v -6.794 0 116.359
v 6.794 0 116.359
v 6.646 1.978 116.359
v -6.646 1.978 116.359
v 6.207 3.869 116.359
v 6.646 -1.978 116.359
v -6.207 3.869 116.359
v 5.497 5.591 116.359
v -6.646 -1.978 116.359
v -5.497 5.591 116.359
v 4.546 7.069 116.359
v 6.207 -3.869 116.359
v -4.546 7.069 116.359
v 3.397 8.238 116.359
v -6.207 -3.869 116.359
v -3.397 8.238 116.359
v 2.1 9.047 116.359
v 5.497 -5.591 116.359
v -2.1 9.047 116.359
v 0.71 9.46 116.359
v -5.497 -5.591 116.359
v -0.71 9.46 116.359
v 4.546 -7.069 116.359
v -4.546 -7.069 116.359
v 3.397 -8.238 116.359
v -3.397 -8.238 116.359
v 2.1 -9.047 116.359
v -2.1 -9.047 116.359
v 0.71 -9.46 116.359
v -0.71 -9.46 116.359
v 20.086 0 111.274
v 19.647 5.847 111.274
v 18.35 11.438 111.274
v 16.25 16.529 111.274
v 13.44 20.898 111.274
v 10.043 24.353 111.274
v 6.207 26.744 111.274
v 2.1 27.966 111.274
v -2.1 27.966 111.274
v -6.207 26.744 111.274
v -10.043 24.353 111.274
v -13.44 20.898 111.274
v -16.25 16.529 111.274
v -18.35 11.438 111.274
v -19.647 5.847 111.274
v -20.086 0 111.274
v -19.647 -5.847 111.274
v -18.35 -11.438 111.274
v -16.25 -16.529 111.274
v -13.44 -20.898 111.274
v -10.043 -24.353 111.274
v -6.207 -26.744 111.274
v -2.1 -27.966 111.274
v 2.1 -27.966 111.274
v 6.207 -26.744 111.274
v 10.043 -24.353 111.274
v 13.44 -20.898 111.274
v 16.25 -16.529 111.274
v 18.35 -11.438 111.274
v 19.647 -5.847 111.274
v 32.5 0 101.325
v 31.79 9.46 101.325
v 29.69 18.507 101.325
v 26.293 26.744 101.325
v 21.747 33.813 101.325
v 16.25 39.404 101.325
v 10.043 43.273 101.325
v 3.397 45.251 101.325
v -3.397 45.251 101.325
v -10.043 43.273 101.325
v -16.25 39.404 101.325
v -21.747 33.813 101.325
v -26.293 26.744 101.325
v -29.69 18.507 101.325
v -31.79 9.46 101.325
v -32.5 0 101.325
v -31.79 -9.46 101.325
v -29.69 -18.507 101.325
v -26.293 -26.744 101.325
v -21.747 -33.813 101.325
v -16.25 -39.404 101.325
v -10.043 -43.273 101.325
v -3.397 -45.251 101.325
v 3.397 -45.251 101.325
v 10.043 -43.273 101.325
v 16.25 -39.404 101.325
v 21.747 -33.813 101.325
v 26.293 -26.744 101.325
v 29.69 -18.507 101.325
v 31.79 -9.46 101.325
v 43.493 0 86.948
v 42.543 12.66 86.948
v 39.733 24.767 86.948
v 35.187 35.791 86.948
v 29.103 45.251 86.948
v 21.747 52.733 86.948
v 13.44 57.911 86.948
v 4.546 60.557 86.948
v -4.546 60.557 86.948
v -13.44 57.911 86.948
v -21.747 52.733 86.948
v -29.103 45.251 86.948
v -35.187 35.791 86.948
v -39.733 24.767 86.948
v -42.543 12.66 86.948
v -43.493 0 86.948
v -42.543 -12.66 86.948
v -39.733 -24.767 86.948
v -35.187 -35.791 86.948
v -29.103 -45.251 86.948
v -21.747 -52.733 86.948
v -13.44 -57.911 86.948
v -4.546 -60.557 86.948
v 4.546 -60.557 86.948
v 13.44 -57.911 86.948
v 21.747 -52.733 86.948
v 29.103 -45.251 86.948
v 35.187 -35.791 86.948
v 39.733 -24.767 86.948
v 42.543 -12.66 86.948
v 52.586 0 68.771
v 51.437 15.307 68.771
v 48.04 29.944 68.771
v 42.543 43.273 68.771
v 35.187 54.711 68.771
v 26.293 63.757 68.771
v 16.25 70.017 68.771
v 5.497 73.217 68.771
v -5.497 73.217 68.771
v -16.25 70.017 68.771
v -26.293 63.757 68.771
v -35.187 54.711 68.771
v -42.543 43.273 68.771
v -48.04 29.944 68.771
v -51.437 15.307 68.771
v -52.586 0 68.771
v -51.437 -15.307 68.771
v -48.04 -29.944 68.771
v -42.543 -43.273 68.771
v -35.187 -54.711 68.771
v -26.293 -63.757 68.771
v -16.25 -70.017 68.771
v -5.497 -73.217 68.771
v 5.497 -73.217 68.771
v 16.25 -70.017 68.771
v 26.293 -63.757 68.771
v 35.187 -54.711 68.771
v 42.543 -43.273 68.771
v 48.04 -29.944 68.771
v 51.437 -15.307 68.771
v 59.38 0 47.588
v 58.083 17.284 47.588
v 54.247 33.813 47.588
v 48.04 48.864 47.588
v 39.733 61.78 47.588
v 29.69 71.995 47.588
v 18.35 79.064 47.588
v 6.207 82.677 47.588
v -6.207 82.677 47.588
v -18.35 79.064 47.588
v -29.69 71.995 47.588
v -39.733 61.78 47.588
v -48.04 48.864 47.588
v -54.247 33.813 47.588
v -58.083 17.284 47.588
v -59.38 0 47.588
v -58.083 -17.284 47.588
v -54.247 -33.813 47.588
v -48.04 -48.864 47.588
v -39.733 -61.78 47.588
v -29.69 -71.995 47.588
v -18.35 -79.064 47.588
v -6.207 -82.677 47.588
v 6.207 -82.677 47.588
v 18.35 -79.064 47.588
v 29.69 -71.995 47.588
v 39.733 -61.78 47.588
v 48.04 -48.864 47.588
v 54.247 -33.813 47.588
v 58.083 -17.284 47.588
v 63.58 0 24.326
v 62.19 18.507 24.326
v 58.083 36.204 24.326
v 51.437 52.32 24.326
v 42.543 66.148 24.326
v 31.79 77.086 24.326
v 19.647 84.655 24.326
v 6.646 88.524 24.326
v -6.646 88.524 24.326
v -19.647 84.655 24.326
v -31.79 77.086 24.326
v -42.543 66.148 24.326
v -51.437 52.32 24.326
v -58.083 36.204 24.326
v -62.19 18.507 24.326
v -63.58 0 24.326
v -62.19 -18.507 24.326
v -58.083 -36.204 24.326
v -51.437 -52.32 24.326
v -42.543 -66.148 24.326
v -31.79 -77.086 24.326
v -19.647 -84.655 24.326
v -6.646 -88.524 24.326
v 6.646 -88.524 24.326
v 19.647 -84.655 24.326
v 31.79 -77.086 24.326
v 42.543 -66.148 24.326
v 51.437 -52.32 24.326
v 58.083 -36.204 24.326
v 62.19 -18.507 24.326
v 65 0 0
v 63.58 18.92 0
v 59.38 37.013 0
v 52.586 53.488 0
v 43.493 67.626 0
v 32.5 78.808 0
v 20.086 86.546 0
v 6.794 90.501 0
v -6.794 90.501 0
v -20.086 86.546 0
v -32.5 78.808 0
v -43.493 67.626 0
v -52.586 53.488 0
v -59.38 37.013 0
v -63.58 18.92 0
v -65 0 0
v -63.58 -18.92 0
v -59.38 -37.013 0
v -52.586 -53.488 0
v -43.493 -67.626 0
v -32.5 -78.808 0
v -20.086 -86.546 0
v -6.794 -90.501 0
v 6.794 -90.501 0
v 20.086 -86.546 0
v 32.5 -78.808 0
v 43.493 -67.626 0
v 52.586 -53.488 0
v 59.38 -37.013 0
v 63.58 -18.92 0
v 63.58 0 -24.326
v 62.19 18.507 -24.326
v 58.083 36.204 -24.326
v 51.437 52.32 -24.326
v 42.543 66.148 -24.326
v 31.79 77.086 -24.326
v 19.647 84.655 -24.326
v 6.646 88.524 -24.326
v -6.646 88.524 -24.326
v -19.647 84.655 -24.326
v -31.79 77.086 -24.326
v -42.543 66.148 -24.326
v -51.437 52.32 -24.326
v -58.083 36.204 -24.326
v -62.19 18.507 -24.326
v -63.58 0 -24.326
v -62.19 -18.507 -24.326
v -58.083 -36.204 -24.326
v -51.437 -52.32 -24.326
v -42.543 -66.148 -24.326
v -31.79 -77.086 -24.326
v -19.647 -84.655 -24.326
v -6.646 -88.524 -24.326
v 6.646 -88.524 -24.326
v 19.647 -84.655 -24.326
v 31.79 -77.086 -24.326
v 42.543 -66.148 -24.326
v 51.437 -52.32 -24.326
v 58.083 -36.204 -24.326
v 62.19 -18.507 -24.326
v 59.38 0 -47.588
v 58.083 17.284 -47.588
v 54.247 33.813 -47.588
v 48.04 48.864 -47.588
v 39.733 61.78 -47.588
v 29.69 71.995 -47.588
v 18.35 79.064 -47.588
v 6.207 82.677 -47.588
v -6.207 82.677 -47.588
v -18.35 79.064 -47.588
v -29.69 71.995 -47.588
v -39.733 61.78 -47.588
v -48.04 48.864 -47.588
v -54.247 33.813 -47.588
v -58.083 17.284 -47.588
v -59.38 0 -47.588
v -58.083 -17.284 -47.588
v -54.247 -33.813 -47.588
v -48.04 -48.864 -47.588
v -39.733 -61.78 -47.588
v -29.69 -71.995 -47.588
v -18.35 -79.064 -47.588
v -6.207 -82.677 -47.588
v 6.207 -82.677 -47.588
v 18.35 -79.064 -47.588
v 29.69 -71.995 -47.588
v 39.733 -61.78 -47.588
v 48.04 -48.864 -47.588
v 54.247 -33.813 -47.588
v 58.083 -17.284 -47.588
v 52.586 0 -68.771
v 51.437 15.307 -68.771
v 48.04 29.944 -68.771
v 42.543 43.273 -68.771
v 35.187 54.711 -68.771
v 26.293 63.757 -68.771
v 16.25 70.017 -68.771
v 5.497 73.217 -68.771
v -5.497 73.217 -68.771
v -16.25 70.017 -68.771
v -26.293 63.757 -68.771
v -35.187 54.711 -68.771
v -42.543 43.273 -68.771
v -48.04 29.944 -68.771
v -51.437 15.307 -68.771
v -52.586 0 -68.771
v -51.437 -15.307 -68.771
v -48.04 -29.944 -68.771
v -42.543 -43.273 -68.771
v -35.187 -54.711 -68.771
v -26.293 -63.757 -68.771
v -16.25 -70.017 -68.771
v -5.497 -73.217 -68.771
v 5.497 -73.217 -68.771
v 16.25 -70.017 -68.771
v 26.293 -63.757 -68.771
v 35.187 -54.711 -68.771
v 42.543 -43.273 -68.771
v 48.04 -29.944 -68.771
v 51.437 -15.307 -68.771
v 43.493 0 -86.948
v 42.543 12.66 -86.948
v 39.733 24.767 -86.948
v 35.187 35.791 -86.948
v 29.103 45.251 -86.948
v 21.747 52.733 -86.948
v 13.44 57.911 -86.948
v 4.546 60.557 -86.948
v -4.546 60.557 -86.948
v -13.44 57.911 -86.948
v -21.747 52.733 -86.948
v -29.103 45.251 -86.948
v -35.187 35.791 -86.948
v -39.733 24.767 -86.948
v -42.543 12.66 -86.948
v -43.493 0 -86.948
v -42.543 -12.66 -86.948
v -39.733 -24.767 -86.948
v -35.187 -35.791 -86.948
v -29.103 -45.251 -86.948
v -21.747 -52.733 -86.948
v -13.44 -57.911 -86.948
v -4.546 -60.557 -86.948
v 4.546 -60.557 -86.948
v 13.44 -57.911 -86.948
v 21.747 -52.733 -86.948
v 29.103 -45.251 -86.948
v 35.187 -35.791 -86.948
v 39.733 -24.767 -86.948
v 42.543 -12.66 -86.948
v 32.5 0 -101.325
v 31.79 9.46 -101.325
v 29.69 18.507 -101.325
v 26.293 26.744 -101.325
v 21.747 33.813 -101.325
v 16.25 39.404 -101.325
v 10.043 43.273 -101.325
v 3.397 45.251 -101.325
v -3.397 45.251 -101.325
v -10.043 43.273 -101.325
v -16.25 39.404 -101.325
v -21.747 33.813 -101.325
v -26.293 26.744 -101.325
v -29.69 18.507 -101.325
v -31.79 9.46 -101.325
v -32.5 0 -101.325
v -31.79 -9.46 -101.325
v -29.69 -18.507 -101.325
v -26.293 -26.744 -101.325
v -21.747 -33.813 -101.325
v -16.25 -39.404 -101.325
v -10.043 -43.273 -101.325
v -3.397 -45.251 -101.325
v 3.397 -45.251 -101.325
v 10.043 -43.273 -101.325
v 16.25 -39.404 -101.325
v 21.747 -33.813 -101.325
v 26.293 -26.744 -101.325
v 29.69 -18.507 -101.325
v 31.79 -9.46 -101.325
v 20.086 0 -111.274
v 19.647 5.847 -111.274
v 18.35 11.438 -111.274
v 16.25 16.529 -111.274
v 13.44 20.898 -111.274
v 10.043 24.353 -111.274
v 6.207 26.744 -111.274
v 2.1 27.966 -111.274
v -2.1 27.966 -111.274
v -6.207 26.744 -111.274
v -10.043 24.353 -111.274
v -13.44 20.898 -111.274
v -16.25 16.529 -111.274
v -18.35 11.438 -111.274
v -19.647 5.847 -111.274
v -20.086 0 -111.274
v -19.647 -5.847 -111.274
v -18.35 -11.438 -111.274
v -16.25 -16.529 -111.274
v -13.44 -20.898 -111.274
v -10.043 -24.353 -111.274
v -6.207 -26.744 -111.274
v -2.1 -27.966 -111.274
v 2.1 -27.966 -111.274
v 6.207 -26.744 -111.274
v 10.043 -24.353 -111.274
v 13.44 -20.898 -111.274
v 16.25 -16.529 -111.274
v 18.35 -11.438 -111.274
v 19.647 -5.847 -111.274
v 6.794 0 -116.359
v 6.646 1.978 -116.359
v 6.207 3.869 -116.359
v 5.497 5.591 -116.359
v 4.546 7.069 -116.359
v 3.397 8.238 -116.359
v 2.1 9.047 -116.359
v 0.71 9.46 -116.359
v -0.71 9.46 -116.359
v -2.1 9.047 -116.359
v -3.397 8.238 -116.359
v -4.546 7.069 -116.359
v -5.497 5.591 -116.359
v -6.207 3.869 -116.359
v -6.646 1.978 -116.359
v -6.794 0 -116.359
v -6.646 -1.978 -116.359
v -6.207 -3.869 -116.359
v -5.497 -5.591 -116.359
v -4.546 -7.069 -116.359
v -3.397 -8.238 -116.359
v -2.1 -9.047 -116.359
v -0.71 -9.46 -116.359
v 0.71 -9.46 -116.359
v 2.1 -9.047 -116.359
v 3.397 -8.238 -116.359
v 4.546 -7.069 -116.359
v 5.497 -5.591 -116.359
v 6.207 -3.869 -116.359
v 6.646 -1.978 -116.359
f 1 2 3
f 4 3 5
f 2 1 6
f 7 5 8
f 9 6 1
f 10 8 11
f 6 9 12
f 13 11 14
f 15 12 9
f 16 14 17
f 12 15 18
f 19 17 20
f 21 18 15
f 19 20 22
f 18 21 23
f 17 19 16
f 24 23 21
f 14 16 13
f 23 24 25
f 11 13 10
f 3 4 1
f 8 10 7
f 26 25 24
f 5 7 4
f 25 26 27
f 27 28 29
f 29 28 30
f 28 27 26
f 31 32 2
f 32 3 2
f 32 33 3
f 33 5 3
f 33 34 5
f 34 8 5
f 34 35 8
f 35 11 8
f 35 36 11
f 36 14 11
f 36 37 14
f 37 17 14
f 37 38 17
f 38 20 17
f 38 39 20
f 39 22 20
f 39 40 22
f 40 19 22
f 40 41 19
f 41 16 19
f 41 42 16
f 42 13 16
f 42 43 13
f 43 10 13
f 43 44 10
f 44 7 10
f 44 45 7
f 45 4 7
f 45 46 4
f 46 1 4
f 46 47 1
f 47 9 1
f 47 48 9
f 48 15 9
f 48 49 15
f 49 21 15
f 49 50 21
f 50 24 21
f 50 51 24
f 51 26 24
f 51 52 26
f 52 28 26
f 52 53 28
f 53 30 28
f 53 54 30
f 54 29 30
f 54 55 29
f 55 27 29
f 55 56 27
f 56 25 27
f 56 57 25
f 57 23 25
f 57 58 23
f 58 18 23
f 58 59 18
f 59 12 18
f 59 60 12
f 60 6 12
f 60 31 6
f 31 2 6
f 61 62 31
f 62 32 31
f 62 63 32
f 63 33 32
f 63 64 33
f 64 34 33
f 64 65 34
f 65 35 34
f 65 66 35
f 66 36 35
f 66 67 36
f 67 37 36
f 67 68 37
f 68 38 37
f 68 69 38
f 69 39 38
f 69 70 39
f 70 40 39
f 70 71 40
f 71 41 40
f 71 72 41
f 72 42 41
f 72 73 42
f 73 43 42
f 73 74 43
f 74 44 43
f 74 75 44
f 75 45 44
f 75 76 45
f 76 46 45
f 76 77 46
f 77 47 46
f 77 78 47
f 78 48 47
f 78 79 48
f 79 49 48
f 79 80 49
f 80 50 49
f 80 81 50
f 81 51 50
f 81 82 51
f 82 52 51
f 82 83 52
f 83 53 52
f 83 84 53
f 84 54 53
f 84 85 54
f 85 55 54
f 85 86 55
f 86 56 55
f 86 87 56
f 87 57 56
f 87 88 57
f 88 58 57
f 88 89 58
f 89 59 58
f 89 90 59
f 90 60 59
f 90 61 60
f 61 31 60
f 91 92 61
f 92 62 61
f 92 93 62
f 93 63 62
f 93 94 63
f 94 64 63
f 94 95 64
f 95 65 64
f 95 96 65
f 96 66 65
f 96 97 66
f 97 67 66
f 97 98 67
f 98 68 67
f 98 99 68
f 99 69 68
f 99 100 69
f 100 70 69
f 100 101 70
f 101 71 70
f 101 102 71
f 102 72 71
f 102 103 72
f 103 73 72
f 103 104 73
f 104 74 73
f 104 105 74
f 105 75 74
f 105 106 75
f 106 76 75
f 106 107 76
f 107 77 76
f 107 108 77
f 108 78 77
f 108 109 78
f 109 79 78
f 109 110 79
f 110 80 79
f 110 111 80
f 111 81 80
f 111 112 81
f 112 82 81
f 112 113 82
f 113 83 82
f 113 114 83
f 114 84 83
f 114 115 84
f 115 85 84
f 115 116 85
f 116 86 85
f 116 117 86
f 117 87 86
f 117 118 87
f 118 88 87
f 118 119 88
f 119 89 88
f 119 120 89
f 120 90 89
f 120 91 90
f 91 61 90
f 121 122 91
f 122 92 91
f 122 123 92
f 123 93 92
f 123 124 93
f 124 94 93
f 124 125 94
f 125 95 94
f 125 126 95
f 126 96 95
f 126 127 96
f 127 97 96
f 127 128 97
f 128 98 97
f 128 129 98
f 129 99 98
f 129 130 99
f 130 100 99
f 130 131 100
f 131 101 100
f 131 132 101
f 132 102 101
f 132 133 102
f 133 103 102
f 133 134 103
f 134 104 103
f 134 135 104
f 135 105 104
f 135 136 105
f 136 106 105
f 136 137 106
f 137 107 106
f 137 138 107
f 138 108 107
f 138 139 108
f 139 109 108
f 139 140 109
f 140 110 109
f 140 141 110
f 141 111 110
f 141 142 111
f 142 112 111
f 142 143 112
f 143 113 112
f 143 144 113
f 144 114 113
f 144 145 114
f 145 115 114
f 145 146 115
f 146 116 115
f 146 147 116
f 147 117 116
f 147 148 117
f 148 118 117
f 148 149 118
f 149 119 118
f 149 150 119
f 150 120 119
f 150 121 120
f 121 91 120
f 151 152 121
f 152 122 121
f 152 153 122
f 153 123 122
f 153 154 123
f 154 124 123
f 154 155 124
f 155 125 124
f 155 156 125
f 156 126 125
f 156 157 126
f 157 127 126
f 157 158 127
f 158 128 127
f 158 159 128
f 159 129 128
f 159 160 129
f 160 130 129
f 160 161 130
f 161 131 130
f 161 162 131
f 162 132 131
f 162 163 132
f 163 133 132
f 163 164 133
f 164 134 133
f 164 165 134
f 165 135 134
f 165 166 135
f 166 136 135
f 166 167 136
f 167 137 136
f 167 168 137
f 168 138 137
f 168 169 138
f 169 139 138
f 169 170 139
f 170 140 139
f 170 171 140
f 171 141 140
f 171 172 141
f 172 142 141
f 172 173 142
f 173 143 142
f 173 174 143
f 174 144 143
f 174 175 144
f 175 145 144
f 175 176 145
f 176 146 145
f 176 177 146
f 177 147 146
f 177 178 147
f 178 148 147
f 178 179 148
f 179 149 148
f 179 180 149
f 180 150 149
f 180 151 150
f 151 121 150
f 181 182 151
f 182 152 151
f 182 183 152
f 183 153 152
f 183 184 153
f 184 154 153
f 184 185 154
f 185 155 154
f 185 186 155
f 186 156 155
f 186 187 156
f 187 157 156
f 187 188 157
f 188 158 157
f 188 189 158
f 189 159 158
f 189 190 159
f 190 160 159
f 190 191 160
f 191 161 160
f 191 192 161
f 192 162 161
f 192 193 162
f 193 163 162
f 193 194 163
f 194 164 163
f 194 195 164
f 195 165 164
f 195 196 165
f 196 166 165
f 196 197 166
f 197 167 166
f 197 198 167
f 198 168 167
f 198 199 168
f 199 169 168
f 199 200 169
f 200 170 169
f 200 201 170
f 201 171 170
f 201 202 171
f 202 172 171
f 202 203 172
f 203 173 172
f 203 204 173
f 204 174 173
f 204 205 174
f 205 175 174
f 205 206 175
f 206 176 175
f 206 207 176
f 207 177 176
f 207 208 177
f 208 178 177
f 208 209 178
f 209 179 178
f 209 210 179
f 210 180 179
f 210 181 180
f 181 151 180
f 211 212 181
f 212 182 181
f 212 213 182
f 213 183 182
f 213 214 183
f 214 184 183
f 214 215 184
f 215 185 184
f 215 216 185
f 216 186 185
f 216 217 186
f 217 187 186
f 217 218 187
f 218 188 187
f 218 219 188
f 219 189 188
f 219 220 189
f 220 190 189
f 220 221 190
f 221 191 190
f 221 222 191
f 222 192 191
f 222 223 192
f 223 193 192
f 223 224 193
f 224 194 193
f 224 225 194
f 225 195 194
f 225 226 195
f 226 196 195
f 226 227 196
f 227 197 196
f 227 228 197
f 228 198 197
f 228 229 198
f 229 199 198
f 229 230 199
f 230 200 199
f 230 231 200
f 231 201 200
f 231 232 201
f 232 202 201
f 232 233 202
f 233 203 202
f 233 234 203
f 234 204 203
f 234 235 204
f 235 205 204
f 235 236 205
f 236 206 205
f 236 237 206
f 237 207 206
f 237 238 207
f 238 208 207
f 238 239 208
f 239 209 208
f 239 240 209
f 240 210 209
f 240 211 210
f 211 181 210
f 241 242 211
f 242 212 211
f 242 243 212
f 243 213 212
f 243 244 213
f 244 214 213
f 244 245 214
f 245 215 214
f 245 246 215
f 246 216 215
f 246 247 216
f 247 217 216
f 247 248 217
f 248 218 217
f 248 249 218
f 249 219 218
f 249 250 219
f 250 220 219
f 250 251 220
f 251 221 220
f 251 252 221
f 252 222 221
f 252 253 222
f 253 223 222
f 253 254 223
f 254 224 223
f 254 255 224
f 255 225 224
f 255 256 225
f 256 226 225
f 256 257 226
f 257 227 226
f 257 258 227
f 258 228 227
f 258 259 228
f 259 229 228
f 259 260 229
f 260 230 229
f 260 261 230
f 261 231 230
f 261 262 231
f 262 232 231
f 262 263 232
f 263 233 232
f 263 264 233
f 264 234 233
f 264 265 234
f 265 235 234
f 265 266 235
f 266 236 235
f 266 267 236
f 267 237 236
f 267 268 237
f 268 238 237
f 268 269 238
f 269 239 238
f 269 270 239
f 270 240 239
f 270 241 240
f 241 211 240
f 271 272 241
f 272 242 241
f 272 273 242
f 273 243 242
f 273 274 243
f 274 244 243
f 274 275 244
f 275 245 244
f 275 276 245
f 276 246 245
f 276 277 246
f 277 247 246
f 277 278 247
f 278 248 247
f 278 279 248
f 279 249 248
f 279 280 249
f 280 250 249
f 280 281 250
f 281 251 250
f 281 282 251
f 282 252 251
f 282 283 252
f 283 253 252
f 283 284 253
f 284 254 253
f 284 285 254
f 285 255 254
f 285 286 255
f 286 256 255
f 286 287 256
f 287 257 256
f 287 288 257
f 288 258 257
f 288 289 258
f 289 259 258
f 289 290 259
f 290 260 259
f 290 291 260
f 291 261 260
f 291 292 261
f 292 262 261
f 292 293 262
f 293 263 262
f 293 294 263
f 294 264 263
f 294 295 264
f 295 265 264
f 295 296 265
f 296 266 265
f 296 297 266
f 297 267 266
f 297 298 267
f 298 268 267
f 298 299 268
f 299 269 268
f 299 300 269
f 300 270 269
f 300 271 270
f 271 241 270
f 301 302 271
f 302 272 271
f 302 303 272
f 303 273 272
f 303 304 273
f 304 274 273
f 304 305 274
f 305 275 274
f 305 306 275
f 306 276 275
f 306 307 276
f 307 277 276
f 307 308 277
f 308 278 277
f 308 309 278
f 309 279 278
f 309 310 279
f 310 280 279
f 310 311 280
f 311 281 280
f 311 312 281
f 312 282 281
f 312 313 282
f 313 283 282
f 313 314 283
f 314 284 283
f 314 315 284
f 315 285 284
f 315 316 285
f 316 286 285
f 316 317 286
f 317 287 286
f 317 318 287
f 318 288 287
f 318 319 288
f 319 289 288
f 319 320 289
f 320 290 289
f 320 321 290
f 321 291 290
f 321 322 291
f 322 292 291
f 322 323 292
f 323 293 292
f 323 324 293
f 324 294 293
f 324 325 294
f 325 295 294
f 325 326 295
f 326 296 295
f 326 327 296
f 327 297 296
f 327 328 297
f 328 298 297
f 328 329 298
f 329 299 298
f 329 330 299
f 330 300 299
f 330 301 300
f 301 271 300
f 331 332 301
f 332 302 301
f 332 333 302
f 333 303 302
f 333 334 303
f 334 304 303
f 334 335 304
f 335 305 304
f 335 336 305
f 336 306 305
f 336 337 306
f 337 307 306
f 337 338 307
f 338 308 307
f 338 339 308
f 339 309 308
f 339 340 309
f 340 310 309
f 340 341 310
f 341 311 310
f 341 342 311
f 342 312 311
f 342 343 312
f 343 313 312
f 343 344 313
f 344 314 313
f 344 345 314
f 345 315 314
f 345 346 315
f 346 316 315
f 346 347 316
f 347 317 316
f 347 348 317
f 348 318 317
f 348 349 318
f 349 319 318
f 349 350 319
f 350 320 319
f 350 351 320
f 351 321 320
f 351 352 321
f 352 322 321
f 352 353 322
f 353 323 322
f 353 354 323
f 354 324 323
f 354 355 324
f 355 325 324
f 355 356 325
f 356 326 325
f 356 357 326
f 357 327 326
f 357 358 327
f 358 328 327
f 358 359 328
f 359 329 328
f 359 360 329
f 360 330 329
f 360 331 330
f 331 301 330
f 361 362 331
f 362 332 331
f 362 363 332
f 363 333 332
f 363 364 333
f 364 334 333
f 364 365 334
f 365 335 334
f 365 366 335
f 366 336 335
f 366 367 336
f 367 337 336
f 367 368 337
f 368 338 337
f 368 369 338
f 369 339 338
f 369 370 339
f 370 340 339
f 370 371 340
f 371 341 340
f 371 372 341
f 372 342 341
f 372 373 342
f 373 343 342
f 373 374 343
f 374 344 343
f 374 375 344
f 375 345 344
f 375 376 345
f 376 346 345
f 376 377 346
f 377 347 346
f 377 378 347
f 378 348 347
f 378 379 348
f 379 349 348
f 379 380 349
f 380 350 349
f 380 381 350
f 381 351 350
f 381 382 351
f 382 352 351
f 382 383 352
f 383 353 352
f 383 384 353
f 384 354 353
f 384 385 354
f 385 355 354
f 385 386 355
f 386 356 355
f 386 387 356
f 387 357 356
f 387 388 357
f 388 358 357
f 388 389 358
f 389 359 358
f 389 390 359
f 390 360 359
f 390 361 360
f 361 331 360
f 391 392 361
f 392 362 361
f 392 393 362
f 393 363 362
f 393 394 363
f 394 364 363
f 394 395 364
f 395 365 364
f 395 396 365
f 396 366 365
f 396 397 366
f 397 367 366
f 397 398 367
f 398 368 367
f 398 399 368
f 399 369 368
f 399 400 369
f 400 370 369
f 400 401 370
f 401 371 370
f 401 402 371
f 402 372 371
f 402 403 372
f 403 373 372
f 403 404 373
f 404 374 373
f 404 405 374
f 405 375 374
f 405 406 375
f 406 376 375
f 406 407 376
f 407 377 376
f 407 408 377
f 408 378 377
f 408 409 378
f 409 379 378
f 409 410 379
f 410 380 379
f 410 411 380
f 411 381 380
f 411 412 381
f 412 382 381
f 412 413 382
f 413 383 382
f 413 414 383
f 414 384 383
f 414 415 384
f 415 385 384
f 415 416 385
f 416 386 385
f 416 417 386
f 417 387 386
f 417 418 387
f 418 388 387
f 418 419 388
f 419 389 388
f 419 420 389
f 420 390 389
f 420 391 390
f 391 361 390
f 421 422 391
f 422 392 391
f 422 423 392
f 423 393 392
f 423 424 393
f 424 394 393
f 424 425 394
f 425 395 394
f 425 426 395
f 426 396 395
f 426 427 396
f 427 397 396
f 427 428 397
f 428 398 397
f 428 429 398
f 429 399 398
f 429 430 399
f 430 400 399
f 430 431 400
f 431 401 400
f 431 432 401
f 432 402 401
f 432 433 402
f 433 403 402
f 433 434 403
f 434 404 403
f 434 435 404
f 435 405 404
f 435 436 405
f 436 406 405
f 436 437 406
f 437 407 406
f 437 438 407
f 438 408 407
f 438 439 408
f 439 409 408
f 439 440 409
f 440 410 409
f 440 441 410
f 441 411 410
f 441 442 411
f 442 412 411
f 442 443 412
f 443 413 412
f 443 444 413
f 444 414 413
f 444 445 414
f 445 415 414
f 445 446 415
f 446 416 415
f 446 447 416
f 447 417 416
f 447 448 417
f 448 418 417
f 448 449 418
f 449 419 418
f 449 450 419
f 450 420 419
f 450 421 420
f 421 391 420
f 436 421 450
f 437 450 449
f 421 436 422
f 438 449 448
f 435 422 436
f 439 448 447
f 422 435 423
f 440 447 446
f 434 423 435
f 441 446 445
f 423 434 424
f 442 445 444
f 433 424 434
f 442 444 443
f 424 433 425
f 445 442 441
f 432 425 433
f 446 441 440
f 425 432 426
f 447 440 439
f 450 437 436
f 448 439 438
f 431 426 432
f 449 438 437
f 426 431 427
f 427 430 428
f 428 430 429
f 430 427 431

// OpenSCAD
// Generated by SolidPython 1.0.1 on 2020-07-29 00:39:26


scale(v = [5, 7, 9]) {
	sphere(r = 13);
}
/***********************************************
*********      SolidPython code:      **********
************************************************
 
# import packages: SolidPython
from solid import *
from solid.utils import *
from itertools import chain, combinations


class Resize:

    def __init__(self, scad_file):
        self.scad_file = scad_file
        #self.scad_file = import_scad(scad_file)
        # cone/cylinder param:
        self.r1 = 0
        self.r2 = 0
        self.h = 0
        # rectangular prism param:
        self.w = 0
        self.l = 0
        # ellipse param:
        self.r = 0

    # import OpenScad code (file name corresponds to shape)


    # classify shape + parameters
    def assign(self, param1, param2, param3):
        if self.scad_file == 'cone.scad':
            self.r1 = param1
            self.r2 = param2
            self.h = param3
        elif self.scad_file == 'cylinder.scad':
            self.r1 = param1
            self.r2 = param2
            self.h = param3
        elif self.scad_file == 'rectangularPrism.scad':
            self.h = param1
            self.l = param2
            self.w = param3
        else:
            self.r = param1
            self.h = param2

    # resize parameters
    def iterate(self):
        x = range(3, 20, 2)
        i = 1
        if self.scad_file == 'cone.scad':
            tempList = list(combinations(x, 2))
            for temp in tempList:
                param1 = temp[0]
                param2 = temp[1]
                filepath = 'produced_scad_files/' + 'cone' + str(param1) + '_' + str(param2) + '_' + '.scad'
                scad_render_to_file(cylinder(h=param1, r1=param2, r2=0), filepath)

        elif self.scad_file == 'cylinder.scad':
            tempList = list(combinations(x, 3))
            for temp in tempList:
                param1 = temp[0]
                param2 = temp[1]
                filepath = 'produced_scad_files/' + 'cylinder' + str(param1) + '_' + str(param2) + '_' + '.scad'
                scad_render_to_file(cylinder(h=param1, r1=param2, r2=param2), filepath)

        elif self.scad_file == 'rectangularPrism.scad':
            tempList = list(combinations(x, 3))
            for temp in tempList:
                param1 = temp[0]
                param2 = temp[1]
                param3 = temp[2]
                filepath = 'produced_scad_files/' + 'rectangularPrism' + str(param1) + '_' + str(param2) + '_' + str(
                    param3) + '.scad'
                scad_render_to_file(cube(size=(param1, param2, param3)), filepath)

        elif self.scad_file == 'ellipse.scad':
            tempList = list(combinations(x, 4))
            for temp in tempList:
                param1 = temp[0]
                param2 = temp[1]
                param3 = temp[2]
                param4 = temp[3]
                filepath = 'produced_scad_files/' + 'ellipse' + str(param1) + '_' + str(param2) + '_' + str(param3) + '_' + str(param4) + '.scad'
                scad_render_to_file(scale([param1, param2, param3])(sphere(r=param4)), filepath)

    def render_to_scadfile(self):
        scad_render_to_file(scad, 'example.scad') 
 
************************************************/
